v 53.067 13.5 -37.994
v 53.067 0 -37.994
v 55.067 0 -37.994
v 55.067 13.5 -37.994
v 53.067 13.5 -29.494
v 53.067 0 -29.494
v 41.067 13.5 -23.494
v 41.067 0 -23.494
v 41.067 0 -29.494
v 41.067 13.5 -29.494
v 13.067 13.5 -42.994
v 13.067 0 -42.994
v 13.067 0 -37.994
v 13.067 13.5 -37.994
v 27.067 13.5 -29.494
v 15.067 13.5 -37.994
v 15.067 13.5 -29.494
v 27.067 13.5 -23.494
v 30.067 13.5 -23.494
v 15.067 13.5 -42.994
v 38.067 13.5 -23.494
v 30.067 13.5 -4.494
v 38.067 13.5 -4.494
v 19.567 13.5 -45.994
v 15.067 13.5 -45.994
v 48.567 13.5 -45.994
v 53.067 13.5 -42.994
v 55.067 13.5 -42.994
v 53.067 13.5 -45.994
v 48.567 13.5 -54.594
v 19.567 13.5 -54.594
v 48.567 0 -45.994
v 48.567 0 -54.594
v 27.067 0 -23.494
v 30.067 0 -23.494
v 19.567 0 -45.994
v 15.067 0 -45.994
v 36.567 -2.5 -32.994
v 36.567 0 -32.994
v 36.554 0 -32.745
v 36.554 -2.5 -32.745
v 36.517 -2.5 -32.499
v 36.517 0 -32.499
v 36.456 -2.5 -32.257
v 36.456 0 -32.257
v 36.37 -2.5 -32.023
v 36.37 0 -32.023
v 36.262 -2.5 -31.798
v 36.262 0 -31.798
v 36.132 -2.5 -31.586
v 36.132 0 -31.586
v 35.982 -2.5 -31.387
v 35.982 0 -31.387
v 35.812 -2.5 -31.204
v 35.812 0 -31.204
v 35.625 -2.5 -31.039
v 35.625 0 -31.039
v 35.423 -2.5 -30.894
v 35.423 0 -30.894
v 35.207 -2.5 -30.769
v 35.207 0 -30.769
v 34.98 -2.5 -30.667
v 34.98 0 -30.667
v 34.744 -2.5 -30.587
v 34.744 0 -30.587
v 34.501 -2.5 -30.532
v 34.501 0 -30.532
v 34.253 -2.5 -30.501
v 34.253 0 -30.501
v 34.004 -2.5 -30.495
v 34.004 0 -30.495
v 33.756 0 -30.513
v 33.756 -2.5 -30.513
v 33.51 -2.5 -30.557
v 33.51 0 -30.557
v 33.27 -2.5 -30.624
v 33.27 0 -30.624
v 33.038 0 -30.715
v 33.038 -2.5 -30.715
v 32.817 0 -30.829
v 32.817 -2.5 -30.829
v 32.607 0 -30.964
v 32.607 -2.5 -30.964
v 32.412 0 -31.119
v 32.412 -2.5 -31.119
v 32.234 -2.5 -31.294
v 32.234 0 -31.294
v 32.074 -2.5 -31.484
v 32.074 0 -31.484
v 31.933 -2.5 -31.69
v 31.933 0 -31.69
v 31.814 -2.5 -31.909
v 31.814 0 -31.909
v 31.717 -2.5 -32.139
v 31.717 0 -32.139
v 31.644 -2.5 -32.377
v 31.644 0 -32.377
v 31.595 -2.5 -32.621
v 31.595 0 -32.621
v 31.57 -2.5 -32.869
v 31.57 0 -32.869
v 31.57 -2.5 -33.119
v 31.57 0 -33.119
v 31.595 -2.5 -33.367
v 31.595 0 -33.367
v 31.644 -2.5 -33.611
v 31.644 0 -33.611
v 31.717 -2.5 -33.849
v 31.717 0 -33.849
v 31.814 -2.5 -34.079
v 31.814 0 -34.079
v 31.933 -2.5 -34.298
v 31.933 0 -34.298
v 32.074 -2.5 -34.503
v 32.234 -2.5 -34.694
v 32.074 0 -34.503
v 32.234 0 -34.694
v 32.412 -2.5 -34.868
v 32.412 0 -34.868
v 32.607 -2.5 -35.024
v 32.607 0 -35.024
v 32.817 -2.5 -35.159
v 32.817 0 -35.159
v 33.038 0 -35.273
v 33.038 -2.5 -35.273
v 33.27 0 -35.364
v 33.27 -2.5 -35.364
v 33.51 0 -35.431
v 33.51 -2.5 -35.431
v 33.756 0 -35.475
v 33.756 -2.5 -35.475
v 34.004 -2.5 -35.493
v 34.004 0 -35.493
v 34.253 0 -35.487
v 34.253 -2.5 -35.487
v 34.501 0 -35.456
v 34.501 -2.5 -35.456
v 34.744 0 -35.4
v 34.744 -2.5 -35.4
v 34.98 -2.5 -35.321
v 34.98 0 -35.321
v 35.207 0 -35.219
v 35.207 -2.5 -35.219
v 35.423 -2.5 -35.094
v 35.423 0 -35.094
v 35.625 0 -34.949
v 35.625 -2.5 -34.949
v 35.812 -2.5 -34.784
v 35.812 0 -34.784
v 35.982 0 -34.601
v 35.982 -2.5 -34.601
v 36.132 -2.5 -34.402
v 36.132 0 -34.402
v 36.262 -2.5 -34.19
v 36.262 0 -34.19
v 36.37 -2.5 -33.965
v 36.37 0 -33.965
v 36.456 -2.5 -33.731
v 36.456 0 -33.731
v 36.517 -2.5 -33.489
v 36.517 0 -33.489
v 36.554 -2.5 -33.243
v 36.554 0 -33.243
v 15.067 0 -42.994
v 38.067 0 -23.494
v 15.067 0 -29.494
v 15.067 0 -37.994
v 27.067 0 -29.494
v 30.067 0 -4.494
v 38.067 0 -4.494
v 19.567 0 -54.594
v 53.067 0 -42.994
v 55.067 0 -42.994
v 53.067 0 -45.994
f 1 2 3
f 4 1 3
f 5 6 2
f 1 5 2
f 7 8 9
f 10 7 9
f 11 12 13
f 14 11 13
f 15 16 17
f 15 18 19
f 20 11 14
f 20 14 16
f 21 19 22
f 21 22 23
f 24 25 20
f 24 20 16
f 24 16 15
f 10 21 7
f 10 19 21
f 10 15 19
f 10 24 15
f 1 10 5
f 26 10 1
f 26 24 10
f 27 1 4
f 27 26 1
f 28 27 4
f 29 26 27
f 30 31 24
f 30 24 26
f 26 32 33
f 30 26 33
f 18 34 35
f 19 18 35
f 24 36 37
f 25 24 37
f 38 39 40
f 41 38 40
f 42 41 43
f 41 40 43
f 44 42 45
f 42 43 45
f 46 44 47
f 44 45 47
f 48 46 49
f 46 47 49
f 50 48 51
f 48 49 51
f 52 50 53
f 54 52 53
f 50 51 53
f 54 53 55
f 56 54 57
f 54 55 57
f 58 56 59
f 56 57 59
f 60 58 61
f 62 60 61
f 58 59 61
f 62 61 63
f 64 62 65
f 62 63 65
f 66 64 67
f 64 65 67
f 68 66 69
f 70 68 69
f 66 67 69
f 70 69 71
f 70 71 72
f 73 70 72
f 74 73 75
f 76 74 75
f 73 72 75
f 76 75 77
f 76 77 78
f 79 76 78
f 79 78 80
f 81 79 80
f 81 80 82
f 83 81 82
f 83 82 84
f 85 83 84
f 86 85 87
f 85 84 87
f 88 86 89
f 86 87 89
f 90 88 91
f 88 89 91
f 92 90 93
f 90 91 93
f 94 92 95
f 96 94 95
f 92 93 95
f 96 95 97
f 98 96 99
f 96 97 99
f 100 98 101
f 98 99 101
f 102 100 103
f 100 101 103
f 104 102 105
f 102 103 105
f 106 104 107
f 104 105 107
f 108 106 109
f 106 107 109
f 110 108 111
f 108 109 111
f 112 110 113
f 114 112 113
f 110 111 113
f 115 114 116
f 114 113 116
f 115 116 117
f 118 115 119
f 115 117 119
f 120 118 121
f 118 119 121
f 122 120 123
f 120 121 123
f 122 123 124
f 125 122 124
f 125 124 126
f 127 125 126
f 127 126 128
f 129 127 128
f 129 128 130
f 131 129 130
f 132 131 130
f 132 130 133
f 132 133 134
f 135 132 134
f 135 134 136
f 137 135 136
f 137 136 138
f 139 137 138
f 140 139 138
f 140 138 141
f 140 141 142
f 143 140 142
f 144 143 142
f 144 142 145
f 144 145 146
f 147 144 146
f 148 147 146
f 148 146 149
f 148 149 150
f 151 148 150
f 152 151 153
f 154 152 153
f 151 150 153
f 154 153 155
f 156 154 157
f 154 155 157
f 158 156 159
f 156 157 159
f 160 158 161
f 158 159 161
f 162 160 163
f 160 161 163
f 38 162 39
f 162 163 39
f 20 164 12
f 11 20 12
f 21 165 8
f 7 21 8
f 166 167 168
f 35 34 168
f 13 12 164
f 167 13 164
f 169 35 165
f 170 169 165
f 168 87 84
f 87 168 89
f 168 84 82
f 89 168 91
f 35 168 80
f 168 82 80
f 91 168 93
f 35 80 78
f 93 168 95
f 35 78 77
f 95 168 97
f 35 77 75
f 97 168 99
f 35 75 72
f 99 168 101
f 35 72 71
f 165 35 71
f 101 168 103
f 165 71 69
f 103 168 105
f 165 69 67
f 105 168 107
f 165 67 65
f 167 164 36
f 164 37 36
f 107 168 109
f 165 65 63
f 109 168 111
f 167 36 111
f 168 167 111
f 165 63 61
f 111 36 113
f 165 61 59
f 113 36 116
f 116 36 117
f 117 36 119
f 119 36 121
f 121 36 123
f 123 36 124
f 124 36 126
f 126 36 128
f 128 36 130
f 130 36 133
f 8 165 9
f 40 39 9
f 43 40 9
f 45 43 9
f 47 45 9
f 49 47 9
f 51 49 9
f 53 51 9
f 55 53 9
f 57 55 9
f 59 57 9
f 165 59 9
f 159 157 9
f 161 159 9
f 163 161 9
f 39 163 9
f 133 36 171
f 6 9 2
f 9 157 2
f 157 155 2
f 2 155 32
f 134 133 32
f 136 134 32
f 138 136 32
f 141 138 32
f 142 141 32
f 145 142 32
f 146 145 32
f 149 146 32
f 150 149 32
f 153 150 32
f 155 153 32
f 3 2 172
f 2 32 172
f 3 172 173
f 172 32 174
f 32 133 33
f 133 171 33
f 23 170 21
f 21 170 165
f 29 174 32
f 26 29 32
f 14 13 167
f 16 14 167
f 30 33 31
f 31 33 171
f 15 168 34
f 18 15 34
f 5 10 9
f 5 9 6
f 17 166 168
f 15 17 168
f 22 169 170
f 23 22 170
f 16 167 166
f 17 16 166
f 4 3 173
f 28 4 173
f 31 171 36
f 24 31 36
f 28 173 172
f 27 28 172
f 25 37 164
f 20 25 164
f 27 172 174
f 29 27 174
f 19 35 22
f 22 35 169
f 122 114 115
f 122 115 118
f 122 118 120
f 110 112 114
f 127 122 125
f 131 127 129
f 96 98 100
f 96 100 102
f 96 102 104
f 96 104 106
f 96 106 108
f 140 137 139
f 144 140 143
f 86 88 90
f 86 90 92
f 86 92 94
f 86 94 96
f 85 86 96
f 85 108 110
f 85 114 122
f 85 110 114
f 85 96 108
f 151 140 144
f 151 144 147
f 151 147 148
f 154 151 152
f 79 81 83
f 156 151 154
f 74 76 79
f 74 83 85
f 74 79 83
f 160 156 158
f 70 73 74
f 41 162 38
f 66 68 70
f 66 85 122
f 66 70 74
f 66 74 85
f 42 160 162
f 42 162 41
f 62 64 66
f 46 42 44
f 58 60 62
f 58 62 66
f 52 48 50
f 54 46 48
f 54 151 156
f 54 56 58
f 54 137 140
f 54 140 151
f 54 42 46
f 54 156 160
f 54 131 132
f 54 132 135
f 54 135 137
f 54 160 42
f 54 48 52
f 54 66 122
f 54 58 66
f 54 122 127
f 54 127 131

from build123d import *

# Parameters (mm, degrees)
BOSS_EXTRUDE1_DEPTH = 13.5
SKETCH2_R           = 2.5
BOSS_EXTRUDE2_DEPTH = 2.5


with BuildPart() as part:
    # Sketch1 → Boss-Extrude1 (new body)
    with BuildSketch(Plane(origin=(0, 0, 0), x_dir=(1, 0, 0), z_dir=(0, 1, 0))):
        Polygon((30.066607979, 23.493934911), (30.066607979, 4.493934911), (38.066607979, 4.493934911), (38.066607979, 23.493934911), (41.066607979, 23.493934911), (41.066607979, 29.493934911), (53.066607979, 29.493934911), (53.066607979, 37.993934911), (55.066607979, 37.993934911), (55.066607979, 42.993934911), (53.066607979, 42.993934911), (53.066607979, 45.993934911), (48.566607979, 45.993934911), (48.566607979, 54.593934911), (43.066607979, 54.593934911), (25.066607979, 54.593934911), (19.566607979, 54.593934911), (19.566607979, 45.993934911), (15.066607979, 45.993934911), (15.066607979, 42.993934911), (13.066607979, 42.993934911), (13.066607979, 37.993934911), (15.066607979, 37.993934911), (15.066607979, 29.493934911), (27.066607979, 29.493934911), (27.066607979, 23.493934911), align=None)
    extrude(amount=BOSS_EXTRUDE1_DEPTH)

    # Sketch2 → Boss-Extrude2 (add)
    with BuildSketch(Plane.XZ):
        with Locations((34.066607979, -32.993934911)):
            Circle(SKETCH2_R)
    extrude(amount=BOSS_EXTRUDE2_DEPTH)


solid = part.part
